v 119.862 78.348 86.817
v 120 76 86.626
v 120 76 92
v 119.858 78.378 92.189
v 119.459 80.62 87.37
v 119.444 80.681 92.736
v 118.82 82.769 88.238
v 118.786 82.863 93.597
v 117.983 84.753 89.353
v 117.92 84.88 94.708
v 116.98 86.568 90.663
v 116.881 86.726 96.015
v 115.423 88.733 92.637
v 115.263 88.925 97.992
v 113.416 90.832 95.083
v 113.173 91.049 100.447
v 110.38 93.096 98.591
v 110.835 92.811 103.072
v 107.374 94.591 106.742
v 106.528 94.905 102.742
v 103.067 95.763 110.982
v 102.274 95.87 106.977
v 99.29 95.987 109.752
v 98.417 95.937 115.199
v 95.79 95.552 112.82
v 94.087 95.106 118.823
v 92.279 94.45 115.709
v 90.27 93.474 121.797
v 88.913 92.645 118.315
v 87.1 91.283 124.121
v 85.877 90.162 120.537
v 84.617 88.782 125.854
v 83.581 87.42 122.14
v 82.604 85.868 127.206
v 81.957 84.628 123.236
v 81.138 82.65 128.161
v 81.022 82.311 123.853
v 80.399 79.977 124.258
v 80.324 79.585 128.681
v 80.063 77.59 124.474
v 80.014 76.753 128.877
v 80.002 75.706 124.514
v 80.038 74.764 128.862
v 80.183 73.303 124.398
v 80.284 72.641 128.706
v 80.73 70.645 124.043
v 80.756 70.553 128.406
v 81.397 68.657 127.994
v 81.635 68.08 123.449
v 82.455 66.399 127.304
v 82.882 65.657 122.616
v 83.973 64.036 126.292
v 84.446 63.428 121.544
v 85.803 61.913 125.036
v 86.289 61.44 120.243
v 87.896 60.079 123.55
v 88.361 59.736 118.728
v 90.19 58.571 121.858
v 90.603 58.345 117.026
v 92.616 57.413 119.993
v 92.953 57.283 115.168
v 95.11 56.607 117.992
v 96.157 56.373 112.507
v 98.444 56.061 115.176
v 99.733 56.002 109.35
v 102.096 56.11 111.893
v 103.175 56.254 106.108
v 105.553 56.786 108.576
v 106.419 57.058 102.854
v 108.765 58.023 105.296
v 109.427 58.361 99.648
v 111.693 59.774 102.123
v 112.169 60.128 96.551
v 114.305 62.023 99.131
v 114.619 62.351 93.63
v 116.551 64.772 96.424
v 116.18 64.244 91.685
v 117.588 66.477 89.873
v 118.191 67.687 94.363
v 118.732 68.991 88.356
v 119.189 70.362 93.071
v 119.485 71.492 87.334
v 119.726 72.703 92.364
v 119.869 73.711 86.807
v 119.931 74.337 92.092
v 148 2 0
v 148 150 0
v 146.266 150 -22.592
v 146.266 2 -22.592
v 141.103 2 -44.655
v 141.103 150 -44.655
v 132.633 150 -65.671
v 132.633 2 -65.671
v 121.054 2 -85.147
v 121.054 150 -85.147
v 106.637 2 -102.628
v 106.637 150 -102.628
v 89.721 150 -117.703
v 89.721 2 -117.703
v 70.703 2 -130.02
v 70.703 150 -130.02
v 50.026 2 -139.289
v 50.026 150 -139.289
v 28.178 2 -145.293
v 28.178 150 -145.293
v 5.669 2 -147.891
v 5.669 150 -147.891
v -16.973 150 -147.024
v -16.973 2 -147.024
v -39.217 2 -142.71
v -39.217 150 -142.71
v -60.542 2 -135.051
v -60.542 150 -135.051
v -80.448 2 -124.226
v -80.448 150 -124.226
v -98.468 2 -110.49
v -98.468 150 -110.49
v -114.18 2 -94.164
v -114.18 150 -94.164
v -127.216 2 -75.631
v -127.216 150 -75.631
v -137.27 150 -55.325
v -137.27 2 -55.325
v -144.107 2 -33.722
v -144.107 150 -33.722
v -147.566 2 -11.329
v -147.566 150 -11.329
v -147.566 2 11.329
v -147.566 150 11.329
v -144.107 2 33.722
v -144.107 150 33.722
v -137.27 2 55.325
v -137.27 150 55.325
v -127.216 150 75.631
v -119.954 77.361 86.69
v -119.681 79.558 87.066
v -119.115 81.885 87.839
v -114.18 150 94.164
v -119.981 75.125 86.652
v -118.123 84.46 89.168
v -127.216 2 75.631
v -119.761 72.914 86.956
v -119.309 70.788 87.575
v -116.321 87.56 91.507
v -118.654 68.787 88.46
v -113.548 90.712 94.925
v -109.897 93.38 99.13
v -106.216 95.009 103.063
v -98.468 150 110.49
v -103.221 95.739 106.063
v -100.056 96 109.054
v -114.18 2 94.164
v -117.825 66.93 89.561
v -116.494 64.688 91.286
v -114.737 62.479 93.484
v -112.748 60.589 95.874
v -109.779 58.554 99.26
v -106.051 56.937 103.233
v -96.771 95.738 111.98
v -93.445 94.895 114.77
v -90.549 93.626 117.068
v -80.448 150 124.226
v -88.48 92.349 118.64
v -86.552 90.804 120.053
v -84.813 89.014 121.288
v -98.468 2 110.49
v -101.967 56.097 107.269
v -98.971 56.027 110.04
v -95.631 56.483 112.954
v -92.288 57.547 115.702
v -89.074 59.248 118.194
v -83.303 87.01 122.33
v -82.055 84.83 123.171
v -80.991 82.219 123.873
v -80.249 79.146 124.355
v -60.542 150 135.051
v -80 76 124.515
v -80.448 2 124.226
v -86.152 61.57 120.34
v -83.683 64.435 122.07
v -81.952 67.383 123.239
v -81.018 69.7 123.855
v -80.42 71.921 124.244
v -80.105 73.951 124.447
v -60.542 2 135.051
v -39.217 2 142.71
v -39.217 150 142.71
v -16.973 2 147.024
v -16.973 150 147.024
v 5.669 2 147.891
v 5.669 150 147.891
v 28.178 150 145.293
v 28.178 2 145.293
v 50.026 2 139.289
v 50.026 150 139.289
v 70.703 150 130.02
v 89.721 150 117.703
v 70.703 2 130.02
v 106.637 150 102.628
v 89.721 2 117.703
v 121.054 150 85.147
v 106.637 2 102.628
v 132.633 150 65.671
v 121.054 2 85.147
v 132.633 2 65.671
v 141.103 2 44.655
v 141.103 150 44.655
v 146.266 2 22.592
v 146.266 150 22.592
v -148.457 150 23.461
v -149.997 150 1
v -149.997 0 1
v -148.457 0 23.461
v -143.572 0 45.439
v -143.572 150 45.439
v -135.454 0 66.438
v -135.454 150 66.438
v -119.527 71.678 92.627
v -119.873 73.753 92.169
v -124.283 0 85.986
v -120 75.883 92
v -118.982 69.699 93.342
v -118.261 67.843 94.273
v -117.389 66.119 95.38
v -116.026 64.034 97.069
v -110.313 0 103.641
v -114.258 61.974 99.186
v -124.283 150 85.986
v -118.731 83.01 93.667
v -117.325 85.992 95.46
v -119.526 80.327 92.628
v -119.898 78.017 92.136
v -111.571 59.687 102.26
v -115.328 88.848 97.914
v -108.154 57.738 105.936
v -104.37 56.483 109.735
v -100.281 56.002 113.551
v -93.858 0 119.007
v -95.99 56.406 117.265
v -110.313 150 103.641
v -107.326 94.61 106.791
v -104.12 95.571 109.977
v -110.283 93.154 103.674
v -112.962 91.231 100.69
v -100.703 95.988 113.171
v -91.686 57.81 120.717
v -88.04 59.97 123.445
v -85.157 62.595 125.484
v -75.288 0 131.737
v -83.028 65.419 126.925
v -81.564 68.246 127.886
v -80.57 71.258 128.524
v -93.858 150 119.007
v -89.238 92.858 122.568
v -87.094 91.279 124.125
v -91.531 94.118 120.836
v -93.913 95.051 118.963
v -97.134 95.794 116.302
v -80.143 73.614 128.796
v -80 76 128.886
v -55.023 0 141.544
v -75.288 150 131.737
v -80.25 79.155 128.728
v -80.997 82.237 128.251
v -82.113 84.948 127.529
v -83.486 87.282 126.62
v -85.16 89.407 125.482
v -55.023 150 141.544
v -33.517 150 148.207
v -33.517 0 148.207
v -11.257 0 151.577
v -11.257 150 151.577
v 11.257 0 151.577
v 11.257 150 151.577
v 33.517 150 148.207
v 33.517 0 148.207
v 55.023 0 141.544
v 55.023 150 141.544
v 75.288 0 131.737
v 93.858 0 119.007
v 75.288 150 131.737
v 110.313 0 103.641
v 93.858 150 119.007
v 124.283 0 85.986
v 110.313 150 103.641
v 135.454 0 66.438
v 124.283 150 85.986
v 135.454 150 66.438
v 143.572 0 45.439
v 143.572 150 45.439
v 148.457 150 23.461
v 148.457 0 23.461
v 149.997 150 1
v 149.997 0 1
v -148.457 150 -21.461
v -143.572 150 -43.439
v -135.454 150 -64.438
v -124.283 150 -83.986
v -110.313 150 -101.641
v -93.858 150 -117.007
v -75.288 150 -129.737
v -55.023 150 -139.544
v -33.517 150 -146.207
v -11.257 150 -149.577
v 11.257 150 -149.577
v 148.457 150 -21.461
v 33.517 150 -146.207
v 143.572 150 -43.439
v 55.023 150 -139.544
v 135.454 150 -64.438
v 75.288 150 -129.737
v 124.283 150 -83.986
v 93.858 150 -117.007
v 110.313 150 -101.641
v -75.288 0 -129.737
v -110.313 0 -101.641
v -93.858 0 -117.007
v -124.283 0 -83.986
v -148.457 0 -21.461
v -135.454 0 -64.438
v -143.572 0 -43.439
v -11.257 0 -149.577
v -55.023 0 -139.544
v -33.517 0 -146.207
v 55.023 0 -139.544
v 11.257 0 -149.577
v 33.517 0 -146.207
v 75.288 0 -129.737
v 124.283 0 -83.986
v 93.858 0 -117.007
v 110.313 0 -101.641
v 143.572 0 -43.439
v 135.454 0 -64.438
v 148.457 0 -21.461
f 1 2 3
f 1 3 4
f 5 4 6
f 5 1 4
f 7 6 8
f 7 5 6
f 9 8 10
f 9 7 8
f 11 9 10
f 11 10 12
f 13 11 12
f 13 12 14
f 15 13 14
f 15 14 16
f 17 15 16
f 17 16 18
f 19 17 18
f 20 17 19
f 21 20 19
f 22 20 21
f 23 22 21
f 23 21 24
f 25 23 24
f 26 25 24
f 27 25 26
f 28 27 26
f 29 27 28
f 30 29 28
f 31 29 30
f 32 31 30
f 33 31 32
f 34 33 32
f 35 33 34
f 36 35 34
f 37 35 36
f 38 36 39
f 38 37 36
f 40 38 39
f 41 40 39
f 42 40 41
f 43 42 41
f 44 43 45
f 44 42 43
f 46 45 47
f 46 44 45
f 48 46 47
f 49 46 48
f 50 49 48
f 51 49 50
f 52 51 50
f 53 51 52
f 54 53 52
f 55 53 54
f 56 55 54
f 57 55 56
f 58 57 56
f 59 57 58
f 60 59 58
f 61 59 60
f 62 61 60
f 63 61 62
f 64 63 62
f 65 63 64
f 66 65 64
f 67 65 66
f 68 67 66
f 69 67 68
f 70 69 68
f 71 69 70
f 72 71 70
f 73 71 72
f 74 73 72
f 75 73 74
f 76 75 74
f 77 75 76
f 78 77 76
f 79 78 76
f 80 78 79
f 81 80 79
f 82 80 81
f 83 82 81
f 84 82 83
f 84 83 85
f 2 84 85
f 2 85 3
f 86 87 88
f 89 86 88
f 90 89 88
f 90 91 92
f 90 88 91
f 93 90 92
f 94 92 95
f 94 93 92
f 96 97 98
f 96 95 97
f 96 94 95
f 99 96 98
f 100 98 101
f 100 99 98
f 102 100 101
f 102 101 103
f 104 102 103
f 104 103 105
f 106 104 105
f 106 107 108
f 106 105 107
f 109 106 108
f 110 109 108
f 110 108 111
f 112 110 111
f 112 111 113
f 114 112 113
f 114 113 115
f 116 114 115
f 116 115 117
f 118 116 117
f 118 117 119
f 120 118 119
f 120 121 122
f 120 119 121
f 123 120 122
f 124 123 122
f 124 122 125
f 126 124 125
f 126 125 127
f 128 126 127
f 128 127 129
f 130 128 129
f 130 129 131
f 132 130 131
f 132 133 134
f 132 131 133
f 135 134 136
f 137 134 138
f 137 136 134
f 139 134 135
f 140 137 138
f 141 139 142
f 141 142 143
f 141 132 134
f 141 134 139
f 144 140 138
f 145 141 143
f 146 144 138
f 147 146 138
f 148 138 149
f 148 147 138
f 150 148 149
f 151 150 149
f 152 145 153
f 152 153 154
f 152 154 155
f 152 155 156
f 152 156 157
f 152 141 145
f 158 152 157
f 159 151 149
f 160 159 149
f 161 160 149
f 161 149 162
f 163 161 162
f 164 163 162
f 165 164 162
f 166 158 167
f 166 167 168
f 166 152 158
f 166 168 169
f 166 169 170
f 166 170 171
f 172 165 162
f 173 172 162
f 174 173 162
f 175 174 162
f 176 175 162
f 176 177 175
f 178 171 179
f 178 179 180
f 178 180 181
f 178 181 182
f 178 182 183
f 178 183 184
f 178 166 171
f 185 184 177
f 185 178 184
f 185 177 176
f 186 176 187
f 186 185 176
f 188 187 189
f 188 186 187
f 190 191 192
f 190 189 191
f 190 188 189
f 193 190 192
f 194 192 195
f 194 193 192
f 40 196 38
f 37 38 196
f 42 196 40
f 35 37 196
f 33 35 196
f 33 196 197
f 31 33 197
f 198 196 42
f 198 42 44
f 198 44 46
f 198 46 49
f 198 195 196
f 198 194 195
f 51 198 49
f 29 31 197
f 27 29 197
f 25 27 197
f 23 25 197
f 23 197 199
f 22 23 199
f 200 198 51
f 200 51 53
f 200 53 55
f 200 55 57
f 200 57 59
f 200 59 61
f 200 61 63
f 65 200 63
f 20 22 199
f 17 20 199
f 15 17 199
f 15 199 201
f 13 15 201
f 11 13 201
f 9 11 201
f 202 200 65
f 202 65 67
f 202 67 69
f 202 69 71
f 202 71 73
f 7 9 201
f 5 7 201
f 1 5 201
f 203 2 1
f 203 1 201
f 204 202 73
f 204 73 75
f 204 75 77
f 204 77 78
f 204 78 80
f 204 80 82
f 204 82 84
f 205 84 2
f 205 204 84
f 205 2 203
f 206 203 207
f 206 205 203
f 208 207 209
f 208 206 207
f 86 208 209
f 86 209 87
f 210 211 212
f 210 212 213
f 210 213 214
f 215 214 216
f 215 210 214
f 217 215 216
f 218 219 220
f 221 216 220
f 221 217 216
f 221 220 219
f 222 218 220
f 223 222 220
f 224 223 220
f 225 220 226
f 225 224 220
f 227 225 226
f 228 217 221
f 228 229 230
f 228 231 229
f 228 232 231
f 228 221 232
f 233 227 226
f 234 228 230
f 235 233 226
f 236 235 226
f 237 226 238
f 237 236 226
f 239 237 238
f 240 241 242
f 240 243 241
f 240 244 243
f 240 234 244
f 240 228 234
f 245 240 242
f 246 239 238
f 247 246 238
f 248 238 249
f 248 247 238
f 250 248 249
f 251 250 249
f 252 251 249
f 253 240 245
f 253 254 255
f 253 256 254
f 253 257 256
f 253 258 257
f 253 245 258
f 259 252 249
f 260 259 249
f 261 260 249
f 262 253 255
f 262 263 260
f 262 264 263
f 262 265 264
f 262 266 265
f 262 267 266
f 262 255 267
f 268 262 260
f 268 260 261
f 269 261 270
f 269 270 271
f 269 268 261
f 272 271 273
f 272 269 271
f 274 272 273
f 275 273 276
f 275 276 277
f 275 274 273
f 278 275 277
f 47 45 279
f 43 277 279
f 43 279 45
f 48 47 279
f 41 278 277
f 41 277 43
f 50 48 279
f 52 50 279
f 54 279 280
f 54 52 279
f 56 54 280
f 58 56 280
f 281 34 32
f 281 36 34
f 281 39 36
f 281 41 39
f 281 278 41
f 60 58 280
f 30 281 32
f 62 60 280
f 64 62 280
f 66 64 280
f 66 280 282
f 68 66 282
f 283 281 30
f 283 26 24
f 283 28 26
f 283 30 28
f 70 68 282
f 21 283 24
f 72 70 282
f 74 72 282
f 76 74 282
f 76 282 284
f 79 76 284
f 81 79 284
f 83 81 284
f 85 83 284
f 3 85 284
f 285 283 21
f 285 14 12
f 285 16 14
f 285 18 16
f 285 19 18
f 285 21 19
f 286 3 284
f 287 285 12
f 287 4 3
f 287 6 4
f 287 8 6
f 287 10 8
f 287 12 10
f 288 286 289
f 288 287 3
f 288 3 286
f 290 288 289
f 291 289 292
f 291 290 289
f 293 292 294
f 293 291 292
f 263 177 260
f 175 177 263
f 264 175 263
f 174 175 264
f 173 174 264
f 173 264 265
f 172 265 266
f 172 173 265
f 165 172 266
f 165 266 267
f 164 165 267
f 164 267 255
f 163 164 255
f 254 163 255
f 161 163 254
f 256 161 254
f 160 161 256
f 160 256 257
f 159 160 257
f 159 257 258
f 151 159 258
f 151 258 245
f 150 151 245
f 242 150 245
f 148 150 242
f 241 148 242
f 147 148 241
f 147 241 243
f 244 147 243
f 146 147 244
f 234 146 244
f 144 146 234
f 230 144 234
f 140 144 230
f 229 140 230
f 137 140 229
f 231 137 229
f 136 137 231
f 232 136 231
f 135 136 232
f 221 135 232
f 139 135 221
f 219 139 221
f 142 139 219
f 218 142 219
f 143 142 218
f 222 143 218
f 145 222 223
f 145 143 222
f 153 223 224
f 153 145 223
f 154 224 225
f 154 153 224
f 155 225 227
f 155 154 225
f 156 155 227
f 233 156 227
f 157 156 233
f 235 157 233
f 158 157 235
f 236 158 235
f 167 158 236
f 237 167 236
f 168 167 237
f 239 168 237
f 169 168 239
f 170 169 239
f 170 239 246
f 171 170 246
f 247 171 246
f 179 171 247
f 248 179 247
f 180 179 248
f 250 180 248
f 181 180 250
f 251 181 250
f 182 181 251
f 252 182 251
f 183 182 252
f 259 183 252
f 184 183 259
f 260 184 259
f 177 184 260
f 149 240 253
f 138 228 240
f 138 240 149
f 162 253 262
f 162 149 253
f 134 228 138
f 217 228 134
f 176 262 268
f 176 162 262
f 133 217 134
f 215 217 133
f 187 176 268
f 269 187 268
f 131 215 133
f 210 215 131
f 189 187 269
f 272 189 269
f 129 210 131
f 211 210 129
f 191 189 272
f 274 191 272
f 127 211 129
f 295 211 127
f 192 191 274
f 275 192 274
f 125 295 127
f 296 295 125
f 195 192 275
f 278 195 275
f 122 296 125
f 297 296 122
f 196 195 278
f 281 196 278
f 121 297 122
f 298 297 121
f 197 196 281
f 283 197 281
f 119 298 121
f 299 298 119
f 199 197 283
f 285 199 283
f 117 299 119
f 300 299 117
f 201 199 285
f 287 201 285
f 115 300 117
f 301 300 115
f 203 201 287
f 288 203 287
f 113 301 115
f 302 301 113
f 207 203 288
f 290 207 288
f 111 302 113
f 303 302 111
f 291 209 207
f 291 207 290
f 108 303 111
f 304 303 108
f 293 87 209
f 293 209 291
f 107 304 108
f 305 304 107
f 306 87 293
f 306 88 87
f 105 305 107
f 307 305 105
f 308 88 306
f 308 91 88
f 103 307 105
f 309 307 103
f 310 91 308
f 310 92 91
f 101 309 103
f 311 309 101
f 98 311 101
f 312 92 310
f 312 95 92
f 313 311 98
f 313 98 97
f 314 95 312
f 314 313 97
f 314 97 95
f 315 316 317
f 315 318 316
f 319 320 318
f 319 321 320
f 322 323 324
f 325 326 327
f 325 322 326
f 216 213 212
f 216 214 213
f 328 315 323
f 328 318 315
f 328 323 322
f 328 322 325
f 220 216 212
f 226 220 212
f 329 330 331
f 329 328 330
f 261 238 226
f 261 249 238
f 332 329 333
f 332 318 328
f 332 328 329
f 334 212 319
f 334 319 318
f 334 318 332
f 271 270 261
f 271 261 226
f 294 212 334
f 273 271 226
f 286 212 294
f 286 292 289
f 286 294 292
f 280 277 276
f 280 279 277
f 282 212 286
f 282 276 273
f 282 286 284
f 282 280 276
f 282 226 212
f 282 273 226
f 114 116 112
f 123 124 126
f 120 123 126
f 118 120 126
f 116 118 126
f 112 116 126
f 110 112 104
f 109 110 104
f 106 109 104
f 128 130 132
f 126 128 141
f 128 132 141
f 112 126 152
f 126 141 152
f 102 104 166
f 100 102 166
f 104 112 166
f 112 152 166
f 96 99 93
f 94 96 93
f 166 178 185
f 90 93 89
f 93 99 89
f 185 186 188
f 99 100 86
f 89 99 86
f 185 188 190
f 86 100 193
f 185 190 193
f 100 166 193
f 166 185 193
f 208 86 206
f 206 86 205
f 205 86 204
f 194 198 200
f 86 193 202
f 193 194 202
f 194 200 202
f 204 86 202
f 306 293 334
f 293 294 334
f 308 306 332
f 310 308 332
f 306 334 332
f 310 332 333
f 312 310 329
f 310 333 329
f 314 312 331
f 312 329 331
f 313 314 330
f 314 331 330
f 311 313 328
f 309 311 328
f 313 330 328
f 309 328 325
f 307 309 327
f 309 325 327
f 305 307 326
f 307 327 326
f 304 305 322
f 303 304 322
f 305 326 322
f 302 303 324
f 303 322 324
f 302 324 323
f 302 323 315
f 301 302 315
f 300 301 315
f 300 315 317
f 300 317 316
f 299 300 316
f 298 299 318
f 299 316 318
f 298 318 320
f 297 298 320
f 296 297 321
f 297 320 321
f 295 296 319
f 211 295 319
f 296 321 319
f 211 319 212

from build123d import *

# Parameters (mm, degrees)
ESQUISSE2_R             = 150
BOSS_EXTRU_1_DEPTH      = 150
ESQUISSE3_R             = 148
ENL_V_MAT_EXTRU_1_DEPTH = 148
ESQUISSE5_R             = 150
BOSS_EXTRU_2_DEPTH      = 150
ESQUISSE6_R             = 148
ENL_V_MAT_EXTRU_2_DEPTH = 177
ESQUISSE7_R             = 148
BOSS_EXTRU_3_DEPTH      = 2
ESQUISSE9_R             = 20
ENL_V_MAT_EXTRU_3_DEPTH = 200


with BuildPart() as part:
    # Esquisse2 → Boss.-Extru.1 (new body)
    with BuildSketch(Plane(origin=(0, 0, 0), x_dir=(1, 0, 0), z_dir=(0, 1, 0))):
        Circle(ESQUISSE2_R)
    extrude(amount=BOSS_EXTRU_1_DEPTH)

    # Esquisse3 → Enlèv. mat.-Extru.1 (cut)
    with BuildSketch(Plane(origin=(0, 0, 0), x_dir=(1, 0, 0), z_dir=(0, 1, 0))):
        Circle(ESQUISSE3_R)
    extrude(amount=ENL_V_MAT_EXTRU_1_DEPTH, mode=Mode.SUBTRACT)

    # Esquisse5 → Boss.-Extru.2 (add)
    with BuildSketch(Plane(origin=(0, 150, 0), x_dir=(1, 0, 0), z_dir=(0, 1, 0))):
        with Locations((0, -2)):
            Circle(ESQUISSE5_R)
    extrude(amount=-BOSS_EXTRU_2_DEPTH)

    # Esquisse6 → Enlèv. mat.-Extru.2 (cut)
    with BuildSketch(Plane(origin=(0, 0, 0), x_dir=(1, 0, 0), z_dir=(0, 1, 0))):
        Circle(ESQUISSE6_R)
    extrude(amount=ENL_V_MAT_EXTRU_2_DEPTH, mode=Mode.SUBTRACT)

    # Esquisse7 → Boss.-Extru.3 (add)
    with BuildSketch(Plane.XZ):
        Circle(ESQUISSE7_R)
    extrude(amount=-BOSS_EXTRU_3_DEPTH)

    # Esquisse9 → Enlèv. mat.-Extru.3 (cut)
    with BuildSketch(Plane.XY):
        with Locations((-100, 76)):
            Circle(ESQUISSE9_R)
        with Locations((100, 76)):
            Circle(ESQUISSE9_R)
    extrude(amount=ENL_V_MAT_EXTRU_3_DEPTH, mode=Mode.SUBTRACT)


solid = part.part
